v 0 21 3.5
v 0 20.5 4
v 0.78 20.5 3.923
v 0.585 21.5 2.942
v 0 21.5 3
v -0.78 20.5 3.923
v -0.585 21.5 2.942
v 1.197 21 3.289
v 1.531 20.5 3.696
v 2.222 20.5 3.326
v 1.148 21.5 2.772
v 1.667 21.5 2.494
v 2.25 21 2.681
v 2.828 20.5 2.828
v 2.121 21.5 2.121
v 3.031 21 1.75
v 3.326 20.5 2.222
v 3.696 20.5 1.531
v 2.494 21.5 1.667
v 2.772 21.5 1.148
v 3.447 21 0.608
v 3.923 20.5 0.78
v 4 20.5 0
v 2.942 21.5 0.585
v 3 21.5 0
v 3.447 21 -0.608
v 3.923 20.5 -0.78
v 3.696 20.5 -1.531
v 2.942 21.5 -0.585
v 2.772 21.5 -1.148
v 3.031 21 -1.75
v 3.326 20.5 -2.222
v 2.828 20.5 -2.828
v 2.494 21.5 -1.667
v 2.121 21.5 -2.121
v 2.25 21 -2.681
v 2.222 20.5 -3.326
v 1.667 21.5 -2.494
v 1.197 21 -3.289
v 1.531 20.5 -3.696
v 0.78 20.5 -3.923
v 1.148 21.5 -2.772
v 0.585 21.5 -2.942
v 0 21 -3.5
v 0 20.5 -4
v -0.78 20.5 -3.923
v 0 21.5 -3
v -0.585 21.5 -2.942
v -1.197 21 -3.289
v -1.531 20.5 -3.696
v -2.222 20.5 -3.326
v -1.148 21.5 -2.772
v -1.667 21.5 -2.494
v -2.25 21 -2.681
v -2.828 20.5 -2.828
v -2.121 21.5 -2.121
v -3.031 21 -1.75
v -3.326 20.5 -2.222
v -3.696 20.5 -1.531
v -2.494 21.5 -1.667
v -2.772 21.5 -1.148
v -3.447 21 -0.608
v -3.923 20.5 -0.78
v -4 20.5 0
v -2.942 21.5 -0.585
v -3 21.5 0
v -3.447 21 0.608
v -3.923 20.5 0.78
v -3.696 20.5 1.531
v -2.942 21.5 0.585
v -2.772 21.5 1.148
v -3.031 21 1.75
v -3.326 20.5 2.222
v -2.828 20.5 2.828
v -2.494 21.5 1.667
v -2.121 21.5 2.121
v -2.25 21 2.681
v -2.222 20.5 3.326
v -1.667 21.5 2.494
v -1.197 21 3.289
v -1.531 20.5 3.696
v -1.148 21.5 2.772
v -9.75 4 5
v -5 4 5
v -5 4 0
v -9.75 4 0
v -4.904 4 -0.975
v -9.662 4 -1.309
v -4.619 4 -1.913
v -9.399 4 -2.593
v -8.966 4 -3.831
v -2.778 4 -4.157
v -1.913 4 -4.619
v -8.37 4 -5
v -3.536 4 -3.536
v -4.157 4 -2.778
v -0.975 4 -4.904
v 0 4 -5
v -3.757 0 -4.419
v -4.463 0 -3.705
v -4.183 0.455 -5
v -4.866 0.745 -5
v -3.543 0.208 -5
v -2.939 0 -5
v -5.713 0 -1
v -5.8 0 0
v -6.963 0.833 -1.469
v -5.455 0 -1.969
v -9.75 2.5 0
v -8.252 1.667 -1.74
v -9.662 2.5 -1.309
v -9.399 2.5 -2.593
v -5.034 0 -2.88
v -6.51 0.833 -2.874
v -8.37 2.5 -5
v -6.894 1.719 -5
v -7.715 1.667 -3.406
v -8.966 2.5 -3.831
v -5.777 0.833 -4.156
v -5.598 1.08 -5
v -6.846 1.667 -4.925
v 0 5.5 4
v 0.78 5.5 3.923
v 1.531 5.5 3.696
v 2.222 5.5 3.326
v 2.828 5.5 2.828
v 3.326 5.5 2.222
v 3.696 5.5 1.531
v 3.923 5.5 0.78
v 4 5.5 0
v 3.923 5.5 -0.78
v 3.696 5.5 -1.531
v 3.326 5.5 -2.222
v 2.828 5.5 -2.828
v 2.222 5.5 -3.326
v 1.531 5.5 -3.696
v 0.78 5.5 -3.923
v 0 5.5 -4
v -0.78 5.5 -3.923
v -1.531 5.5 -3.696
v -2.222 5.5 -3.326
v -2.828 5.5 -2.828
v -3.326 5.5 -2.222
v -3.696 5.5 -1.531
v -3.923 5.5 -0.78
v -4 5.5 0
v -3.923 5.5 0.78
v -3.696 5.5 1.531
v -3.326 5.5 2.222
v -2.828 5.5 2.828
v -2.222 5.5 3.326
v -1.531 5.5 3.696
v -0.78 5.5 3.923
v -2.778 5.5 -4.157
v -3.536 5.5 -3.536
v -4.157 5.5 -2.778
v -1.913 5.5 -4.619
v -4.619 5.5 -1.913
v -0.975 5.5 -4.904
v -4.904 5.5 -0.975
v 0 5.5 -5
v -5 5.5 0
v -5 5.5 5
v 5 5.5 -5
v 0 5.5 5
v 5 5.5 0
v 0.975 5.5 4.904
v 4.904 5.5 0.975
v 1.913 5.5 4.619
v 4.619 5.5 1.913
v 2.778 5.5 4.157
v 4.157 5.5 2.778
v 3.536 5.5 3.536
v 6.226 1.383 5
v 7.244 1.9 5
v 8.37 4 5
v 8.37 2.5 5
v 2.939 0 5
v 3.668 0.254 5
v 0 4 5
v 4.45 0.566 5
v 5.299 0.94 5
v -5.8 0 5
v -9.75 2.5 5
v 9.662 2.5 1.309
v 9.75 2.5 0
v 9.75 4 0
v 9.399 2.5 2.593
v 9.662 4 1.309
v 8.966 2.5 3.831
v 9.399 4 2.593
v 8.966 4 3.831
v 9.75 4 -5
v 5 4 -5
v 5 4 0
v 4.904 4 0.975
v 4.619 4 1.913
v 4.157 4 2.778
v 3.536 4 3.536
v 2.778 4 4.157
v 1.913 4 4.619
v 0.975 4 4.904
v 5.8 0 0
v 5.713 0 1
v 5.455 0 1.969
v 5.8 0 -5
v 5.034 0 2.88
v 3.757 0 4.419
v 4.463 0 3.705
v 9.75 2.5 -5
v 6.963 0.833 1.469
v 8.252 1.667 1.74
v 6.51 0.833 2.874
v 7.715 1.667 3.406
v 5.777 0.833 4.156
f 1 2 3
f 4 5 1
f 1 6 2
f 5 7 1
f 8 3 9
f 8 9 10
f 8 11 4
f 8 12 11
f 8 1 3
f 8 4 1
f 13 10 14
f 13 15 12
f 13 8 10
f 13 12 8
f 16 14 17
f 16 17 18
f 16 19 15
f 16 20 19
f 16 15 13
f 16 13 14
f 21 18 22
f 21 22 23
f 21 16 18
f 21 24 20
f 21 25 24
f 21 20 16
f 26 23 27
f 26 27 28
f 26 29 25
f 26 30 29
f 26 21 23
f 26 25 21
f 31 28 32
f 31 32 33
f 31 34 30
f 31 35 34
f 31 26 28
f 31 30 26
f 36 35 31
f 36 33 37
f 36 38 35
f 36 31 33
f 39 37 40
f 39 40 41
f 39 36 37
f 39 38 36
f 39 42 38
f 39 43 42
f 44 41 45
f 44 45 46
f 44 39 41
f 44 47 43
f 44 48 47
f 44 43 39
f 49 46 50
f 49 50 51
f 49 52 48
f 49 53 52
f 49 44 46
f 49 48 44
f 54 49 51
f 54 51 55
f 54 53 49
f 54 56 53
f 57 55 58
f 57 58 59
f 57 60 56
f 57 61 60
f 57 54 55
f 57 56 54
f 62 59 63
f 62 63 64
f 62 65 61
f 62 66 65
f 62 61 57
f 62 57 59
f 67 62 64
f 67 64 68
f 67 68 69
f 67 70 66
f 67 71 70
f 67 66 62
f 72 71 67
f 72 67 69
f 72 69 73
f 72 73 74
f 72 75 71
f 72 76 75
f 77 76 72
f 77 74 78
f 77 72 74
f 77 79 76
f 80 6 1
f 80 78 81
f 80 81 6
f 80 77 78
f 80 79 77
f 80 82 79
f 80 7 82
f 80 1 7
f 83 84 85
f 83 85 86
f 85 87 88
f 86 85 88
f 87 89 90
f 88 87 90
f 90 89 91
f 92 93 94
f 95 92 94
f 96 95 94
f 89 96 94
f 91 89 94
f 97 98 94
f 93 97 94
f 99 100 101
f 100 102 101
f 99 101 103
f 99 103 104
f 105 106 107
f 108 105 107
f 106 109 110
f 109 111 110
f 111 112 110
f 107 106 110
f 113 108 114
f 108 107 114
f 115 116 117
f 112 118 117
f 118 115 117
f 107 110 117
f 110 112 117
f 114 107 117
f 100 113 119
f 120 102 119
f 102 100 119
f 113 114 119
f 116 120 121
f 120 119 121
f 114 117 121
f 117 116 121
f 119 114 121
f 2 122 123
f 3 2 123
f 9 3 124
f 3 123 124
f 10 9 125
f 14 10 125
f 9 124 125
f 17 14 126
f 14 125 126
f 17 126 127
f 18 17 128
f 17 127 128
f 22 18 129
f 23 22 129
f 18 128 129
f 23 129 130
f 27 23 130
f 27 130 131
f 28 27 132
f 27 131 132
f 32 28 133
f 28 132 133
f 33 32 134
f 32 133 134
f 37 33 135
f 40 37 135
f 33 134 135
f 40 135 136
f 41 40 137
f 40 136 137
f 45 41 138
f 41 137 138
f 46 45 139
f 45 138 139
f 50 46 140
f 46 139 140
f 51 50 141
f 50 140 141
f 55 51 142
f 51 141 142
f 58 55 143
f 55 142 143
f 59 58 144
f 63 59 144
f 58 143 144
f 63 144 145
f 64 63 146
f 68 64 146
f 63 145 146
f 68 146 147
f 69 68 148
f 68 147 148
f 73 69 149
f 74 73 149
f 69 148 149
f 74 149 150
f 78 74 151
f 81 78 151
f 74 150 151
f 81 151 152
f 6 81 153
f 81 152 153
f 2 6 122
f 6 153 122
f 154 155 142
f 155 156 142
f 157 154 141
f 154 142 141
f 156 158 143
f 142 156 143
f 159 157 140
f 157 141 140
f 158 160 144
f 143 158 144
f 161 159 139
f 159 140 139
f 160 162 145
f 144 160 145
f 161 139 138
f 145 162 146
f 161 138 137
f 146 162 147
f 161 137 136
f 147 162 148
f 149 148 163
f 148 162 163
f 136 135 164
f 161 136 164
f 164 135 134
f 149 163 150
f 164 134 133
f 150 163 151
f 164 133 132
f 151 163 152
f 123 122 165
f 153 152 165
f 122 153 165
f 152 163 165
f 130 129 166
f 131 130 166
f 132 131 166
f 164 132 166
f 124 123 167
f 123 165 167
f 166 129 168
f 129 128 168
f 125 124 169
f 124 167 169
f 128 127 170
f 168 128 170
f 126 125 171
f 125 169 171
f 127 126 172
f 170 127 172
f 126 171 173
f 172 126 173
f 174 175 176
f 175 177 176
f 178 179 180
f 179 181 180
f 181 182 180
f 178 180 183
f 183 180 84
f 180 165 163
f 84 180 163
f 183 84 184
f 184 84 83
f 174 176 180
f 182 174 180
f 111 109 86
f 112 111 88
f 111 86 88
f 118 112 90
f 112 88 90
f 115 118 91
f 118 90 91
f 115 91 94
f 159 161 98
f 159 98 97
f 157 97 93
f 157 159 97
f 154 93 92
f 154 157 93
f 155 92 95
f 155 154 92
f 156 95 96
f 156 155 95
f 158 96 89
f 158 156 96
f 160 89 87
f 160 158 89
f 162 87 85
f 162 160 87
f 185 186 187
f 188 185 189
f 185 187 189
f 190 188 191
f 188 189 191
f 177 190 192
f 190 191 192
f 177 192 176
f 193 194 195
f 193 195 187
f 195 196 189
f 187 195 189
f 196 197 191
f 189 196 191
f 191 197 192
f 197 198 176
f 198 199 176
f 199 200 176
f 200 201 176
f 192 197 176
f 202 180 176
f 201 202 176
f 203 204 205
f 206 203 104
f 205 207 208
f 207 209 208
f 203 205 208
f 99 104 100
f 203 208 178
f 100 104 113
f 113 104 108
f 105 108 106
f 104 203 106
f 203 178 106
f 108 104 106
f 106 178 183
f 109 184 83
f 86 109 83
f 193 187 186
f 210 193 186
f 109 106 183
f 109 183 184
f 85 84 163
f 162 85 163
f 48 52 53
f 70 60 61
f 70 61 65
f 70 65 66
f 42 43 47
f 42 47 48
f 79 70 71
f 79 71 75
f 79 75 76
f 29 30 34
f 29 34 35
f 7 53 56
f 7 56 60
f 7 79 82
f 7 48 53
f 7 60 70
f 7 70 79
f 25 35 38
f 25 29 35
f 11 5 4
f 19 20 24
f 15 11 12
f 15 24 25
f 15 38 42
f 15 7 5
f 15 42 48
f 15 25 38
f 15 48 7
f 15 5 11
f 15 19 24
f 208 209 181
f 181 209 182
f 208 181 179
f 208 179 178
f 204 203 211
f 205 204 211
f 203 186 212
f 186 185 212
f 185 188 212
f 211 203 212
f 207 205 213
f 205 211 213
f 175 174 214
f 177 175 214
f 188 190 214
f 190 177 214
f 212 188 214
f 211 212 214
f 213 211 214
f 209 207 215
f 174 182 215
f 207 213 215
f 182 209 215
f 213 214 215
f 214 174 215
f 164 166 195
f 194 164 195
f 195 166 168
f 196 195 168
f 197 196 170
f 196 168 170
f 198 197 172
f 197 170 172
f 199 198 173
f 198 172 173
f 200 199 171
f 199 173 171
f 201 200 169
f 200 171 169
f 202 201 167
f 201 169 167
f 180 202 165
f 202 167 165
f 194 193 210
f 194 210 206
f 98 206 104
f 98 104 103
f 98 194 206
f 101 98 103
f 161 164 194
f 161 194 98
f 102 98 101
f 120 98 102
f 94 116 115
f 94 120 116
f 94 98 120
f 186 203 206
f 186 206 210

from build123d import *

# Parameters (mm, degrees)
EXTRUDE_1_DEPTH     = 5
CUT_EXTRUDE_1_DEPTH = 1.5
SKETCH_2_R          = 4
EXTRUDE_2_DEPTH     = 16
CUT_EXTRUDE_2_DEPTH = 5
CHAMFER_2_SIZE      = 1


with BuildPart() as part:
    # Эскиз1 → Бобышка-Вытянуть1 (new body, symmetric)
    with BuildSketch(Plane.XY):
        Polygon((9.75, 0), (-9.75, 0), (-9.75, 4), (-5, 4), (-5, 5.5), (5, 5.5), (5, 4), (9.75, 4), align=None)
    extrude(amount=EXTRUDE_1_DEPTH, both=True)

    # Эскиз3 → Вырез-Вытянуть1 (cut)
    with BuildSketch(Plane(origin=(0, 5.5, 0), x_dir=(1, 0, 0), z_dir=(0, 1, 0))):
        with BuildLine():
            Line((-5, 0), (-5, 5))
            Line((-5, 5), (0, 5))
            ThreePointArc((0, 5), (-3.535533906, 3.535533906), (-5, 0))
        make_face()
        with BuildLine():
            Line((0, -5), (5, -5))
            Line((5, -5), (5, 0))
            ThreePointArc((5, 0), (3.535533906, -3.535533906), (0, -5))
        make_face()
    extrude(amount=-CUT_EXTRUDE_1_DEPTH, mode=Mode.SUBTRACT)

    # Эскиз2 → Бобышка-Вытянуть2 (add)
    with BuildSketch(Plane(origin=(0, 5.5, 0), x_dir=(1, 0, 0), z_dir=(0, 1, 0))):
        with Locations(Location((0, 0, 0), (0, 0, 270))):  # turned: the seam where the file's is
            Circle(SKETCH_2_R)
    extrude(amount=EXTRUDE_2_DEPTH)

    # Эскиз4 → Вырез-Вытянуть2 (cut, through all)
    with BuildSketch(Plane(origin=(0, 4, 0), x_dir=(1, 0, 0), z_dir=(0, 1, 0))):
        with BuildLine():
            Line((-8.370334521, 5), (-9.75, 5))
            Line((-9.75, 5), (-9.75, 0))
            ThreePointArc((-9.75, 0), (-9.398756875, 2.59342808), (-8.370334521, 5))
        make_face()
        with BuildLine():
            Line((8.370334521, -5), (9.75, -5))
            Line((9.75, -5), (9.75, 0))
            ThreePointArc((9.75, 0), (9.398756875, -2.59342808), (8.370334521, -5))
        make_face()
    extrude(amount=-CUT_EXTRUDE_2_DEPTH, mode=Mode.SUBTRACT)

    # Вырез-По траектории1: sweep along a path in Эскиз6
    with BuildLine(Plane.XZ) as sweep_1_path:
        Line((0, -9.75), (9.75, -9.75))
        Line((9.75, -9.75), (9.75, 0))
        ThreePointArc((9.75, 0), (6.894291117, 6.894291117), (0, 9.75))
        Line((0, 9.75), (-9.75, 9.75))
        Line((-9.75, 9.75), (-9.75, 0))
        ThreePointArc((-9.75, 0), (-6.894291117, -6.894291117), (0, -9.75))
    # Эскиз5 → Вырез-По траектории1 (sweep, cut)
    with BuildSketch(Plane.XY.offset(5)):
        Polygon((-9.75, 2.5), (-5.8, 0), (-9.75, 0), align=None)
    sweep(path=sweep_1_path.line, transition=Transition.RIGHT, mode=Mode.SUBTRACT)

    # Фаска2
    chamfer_2_edges = [part.edges().sort_by_distance(p)[0] for p in [
        (0, 21.5, -4),
    ]]
    chamfer(chamfer_2_edges, length=CHAMFER_2_SIZE)


solid = part.part
